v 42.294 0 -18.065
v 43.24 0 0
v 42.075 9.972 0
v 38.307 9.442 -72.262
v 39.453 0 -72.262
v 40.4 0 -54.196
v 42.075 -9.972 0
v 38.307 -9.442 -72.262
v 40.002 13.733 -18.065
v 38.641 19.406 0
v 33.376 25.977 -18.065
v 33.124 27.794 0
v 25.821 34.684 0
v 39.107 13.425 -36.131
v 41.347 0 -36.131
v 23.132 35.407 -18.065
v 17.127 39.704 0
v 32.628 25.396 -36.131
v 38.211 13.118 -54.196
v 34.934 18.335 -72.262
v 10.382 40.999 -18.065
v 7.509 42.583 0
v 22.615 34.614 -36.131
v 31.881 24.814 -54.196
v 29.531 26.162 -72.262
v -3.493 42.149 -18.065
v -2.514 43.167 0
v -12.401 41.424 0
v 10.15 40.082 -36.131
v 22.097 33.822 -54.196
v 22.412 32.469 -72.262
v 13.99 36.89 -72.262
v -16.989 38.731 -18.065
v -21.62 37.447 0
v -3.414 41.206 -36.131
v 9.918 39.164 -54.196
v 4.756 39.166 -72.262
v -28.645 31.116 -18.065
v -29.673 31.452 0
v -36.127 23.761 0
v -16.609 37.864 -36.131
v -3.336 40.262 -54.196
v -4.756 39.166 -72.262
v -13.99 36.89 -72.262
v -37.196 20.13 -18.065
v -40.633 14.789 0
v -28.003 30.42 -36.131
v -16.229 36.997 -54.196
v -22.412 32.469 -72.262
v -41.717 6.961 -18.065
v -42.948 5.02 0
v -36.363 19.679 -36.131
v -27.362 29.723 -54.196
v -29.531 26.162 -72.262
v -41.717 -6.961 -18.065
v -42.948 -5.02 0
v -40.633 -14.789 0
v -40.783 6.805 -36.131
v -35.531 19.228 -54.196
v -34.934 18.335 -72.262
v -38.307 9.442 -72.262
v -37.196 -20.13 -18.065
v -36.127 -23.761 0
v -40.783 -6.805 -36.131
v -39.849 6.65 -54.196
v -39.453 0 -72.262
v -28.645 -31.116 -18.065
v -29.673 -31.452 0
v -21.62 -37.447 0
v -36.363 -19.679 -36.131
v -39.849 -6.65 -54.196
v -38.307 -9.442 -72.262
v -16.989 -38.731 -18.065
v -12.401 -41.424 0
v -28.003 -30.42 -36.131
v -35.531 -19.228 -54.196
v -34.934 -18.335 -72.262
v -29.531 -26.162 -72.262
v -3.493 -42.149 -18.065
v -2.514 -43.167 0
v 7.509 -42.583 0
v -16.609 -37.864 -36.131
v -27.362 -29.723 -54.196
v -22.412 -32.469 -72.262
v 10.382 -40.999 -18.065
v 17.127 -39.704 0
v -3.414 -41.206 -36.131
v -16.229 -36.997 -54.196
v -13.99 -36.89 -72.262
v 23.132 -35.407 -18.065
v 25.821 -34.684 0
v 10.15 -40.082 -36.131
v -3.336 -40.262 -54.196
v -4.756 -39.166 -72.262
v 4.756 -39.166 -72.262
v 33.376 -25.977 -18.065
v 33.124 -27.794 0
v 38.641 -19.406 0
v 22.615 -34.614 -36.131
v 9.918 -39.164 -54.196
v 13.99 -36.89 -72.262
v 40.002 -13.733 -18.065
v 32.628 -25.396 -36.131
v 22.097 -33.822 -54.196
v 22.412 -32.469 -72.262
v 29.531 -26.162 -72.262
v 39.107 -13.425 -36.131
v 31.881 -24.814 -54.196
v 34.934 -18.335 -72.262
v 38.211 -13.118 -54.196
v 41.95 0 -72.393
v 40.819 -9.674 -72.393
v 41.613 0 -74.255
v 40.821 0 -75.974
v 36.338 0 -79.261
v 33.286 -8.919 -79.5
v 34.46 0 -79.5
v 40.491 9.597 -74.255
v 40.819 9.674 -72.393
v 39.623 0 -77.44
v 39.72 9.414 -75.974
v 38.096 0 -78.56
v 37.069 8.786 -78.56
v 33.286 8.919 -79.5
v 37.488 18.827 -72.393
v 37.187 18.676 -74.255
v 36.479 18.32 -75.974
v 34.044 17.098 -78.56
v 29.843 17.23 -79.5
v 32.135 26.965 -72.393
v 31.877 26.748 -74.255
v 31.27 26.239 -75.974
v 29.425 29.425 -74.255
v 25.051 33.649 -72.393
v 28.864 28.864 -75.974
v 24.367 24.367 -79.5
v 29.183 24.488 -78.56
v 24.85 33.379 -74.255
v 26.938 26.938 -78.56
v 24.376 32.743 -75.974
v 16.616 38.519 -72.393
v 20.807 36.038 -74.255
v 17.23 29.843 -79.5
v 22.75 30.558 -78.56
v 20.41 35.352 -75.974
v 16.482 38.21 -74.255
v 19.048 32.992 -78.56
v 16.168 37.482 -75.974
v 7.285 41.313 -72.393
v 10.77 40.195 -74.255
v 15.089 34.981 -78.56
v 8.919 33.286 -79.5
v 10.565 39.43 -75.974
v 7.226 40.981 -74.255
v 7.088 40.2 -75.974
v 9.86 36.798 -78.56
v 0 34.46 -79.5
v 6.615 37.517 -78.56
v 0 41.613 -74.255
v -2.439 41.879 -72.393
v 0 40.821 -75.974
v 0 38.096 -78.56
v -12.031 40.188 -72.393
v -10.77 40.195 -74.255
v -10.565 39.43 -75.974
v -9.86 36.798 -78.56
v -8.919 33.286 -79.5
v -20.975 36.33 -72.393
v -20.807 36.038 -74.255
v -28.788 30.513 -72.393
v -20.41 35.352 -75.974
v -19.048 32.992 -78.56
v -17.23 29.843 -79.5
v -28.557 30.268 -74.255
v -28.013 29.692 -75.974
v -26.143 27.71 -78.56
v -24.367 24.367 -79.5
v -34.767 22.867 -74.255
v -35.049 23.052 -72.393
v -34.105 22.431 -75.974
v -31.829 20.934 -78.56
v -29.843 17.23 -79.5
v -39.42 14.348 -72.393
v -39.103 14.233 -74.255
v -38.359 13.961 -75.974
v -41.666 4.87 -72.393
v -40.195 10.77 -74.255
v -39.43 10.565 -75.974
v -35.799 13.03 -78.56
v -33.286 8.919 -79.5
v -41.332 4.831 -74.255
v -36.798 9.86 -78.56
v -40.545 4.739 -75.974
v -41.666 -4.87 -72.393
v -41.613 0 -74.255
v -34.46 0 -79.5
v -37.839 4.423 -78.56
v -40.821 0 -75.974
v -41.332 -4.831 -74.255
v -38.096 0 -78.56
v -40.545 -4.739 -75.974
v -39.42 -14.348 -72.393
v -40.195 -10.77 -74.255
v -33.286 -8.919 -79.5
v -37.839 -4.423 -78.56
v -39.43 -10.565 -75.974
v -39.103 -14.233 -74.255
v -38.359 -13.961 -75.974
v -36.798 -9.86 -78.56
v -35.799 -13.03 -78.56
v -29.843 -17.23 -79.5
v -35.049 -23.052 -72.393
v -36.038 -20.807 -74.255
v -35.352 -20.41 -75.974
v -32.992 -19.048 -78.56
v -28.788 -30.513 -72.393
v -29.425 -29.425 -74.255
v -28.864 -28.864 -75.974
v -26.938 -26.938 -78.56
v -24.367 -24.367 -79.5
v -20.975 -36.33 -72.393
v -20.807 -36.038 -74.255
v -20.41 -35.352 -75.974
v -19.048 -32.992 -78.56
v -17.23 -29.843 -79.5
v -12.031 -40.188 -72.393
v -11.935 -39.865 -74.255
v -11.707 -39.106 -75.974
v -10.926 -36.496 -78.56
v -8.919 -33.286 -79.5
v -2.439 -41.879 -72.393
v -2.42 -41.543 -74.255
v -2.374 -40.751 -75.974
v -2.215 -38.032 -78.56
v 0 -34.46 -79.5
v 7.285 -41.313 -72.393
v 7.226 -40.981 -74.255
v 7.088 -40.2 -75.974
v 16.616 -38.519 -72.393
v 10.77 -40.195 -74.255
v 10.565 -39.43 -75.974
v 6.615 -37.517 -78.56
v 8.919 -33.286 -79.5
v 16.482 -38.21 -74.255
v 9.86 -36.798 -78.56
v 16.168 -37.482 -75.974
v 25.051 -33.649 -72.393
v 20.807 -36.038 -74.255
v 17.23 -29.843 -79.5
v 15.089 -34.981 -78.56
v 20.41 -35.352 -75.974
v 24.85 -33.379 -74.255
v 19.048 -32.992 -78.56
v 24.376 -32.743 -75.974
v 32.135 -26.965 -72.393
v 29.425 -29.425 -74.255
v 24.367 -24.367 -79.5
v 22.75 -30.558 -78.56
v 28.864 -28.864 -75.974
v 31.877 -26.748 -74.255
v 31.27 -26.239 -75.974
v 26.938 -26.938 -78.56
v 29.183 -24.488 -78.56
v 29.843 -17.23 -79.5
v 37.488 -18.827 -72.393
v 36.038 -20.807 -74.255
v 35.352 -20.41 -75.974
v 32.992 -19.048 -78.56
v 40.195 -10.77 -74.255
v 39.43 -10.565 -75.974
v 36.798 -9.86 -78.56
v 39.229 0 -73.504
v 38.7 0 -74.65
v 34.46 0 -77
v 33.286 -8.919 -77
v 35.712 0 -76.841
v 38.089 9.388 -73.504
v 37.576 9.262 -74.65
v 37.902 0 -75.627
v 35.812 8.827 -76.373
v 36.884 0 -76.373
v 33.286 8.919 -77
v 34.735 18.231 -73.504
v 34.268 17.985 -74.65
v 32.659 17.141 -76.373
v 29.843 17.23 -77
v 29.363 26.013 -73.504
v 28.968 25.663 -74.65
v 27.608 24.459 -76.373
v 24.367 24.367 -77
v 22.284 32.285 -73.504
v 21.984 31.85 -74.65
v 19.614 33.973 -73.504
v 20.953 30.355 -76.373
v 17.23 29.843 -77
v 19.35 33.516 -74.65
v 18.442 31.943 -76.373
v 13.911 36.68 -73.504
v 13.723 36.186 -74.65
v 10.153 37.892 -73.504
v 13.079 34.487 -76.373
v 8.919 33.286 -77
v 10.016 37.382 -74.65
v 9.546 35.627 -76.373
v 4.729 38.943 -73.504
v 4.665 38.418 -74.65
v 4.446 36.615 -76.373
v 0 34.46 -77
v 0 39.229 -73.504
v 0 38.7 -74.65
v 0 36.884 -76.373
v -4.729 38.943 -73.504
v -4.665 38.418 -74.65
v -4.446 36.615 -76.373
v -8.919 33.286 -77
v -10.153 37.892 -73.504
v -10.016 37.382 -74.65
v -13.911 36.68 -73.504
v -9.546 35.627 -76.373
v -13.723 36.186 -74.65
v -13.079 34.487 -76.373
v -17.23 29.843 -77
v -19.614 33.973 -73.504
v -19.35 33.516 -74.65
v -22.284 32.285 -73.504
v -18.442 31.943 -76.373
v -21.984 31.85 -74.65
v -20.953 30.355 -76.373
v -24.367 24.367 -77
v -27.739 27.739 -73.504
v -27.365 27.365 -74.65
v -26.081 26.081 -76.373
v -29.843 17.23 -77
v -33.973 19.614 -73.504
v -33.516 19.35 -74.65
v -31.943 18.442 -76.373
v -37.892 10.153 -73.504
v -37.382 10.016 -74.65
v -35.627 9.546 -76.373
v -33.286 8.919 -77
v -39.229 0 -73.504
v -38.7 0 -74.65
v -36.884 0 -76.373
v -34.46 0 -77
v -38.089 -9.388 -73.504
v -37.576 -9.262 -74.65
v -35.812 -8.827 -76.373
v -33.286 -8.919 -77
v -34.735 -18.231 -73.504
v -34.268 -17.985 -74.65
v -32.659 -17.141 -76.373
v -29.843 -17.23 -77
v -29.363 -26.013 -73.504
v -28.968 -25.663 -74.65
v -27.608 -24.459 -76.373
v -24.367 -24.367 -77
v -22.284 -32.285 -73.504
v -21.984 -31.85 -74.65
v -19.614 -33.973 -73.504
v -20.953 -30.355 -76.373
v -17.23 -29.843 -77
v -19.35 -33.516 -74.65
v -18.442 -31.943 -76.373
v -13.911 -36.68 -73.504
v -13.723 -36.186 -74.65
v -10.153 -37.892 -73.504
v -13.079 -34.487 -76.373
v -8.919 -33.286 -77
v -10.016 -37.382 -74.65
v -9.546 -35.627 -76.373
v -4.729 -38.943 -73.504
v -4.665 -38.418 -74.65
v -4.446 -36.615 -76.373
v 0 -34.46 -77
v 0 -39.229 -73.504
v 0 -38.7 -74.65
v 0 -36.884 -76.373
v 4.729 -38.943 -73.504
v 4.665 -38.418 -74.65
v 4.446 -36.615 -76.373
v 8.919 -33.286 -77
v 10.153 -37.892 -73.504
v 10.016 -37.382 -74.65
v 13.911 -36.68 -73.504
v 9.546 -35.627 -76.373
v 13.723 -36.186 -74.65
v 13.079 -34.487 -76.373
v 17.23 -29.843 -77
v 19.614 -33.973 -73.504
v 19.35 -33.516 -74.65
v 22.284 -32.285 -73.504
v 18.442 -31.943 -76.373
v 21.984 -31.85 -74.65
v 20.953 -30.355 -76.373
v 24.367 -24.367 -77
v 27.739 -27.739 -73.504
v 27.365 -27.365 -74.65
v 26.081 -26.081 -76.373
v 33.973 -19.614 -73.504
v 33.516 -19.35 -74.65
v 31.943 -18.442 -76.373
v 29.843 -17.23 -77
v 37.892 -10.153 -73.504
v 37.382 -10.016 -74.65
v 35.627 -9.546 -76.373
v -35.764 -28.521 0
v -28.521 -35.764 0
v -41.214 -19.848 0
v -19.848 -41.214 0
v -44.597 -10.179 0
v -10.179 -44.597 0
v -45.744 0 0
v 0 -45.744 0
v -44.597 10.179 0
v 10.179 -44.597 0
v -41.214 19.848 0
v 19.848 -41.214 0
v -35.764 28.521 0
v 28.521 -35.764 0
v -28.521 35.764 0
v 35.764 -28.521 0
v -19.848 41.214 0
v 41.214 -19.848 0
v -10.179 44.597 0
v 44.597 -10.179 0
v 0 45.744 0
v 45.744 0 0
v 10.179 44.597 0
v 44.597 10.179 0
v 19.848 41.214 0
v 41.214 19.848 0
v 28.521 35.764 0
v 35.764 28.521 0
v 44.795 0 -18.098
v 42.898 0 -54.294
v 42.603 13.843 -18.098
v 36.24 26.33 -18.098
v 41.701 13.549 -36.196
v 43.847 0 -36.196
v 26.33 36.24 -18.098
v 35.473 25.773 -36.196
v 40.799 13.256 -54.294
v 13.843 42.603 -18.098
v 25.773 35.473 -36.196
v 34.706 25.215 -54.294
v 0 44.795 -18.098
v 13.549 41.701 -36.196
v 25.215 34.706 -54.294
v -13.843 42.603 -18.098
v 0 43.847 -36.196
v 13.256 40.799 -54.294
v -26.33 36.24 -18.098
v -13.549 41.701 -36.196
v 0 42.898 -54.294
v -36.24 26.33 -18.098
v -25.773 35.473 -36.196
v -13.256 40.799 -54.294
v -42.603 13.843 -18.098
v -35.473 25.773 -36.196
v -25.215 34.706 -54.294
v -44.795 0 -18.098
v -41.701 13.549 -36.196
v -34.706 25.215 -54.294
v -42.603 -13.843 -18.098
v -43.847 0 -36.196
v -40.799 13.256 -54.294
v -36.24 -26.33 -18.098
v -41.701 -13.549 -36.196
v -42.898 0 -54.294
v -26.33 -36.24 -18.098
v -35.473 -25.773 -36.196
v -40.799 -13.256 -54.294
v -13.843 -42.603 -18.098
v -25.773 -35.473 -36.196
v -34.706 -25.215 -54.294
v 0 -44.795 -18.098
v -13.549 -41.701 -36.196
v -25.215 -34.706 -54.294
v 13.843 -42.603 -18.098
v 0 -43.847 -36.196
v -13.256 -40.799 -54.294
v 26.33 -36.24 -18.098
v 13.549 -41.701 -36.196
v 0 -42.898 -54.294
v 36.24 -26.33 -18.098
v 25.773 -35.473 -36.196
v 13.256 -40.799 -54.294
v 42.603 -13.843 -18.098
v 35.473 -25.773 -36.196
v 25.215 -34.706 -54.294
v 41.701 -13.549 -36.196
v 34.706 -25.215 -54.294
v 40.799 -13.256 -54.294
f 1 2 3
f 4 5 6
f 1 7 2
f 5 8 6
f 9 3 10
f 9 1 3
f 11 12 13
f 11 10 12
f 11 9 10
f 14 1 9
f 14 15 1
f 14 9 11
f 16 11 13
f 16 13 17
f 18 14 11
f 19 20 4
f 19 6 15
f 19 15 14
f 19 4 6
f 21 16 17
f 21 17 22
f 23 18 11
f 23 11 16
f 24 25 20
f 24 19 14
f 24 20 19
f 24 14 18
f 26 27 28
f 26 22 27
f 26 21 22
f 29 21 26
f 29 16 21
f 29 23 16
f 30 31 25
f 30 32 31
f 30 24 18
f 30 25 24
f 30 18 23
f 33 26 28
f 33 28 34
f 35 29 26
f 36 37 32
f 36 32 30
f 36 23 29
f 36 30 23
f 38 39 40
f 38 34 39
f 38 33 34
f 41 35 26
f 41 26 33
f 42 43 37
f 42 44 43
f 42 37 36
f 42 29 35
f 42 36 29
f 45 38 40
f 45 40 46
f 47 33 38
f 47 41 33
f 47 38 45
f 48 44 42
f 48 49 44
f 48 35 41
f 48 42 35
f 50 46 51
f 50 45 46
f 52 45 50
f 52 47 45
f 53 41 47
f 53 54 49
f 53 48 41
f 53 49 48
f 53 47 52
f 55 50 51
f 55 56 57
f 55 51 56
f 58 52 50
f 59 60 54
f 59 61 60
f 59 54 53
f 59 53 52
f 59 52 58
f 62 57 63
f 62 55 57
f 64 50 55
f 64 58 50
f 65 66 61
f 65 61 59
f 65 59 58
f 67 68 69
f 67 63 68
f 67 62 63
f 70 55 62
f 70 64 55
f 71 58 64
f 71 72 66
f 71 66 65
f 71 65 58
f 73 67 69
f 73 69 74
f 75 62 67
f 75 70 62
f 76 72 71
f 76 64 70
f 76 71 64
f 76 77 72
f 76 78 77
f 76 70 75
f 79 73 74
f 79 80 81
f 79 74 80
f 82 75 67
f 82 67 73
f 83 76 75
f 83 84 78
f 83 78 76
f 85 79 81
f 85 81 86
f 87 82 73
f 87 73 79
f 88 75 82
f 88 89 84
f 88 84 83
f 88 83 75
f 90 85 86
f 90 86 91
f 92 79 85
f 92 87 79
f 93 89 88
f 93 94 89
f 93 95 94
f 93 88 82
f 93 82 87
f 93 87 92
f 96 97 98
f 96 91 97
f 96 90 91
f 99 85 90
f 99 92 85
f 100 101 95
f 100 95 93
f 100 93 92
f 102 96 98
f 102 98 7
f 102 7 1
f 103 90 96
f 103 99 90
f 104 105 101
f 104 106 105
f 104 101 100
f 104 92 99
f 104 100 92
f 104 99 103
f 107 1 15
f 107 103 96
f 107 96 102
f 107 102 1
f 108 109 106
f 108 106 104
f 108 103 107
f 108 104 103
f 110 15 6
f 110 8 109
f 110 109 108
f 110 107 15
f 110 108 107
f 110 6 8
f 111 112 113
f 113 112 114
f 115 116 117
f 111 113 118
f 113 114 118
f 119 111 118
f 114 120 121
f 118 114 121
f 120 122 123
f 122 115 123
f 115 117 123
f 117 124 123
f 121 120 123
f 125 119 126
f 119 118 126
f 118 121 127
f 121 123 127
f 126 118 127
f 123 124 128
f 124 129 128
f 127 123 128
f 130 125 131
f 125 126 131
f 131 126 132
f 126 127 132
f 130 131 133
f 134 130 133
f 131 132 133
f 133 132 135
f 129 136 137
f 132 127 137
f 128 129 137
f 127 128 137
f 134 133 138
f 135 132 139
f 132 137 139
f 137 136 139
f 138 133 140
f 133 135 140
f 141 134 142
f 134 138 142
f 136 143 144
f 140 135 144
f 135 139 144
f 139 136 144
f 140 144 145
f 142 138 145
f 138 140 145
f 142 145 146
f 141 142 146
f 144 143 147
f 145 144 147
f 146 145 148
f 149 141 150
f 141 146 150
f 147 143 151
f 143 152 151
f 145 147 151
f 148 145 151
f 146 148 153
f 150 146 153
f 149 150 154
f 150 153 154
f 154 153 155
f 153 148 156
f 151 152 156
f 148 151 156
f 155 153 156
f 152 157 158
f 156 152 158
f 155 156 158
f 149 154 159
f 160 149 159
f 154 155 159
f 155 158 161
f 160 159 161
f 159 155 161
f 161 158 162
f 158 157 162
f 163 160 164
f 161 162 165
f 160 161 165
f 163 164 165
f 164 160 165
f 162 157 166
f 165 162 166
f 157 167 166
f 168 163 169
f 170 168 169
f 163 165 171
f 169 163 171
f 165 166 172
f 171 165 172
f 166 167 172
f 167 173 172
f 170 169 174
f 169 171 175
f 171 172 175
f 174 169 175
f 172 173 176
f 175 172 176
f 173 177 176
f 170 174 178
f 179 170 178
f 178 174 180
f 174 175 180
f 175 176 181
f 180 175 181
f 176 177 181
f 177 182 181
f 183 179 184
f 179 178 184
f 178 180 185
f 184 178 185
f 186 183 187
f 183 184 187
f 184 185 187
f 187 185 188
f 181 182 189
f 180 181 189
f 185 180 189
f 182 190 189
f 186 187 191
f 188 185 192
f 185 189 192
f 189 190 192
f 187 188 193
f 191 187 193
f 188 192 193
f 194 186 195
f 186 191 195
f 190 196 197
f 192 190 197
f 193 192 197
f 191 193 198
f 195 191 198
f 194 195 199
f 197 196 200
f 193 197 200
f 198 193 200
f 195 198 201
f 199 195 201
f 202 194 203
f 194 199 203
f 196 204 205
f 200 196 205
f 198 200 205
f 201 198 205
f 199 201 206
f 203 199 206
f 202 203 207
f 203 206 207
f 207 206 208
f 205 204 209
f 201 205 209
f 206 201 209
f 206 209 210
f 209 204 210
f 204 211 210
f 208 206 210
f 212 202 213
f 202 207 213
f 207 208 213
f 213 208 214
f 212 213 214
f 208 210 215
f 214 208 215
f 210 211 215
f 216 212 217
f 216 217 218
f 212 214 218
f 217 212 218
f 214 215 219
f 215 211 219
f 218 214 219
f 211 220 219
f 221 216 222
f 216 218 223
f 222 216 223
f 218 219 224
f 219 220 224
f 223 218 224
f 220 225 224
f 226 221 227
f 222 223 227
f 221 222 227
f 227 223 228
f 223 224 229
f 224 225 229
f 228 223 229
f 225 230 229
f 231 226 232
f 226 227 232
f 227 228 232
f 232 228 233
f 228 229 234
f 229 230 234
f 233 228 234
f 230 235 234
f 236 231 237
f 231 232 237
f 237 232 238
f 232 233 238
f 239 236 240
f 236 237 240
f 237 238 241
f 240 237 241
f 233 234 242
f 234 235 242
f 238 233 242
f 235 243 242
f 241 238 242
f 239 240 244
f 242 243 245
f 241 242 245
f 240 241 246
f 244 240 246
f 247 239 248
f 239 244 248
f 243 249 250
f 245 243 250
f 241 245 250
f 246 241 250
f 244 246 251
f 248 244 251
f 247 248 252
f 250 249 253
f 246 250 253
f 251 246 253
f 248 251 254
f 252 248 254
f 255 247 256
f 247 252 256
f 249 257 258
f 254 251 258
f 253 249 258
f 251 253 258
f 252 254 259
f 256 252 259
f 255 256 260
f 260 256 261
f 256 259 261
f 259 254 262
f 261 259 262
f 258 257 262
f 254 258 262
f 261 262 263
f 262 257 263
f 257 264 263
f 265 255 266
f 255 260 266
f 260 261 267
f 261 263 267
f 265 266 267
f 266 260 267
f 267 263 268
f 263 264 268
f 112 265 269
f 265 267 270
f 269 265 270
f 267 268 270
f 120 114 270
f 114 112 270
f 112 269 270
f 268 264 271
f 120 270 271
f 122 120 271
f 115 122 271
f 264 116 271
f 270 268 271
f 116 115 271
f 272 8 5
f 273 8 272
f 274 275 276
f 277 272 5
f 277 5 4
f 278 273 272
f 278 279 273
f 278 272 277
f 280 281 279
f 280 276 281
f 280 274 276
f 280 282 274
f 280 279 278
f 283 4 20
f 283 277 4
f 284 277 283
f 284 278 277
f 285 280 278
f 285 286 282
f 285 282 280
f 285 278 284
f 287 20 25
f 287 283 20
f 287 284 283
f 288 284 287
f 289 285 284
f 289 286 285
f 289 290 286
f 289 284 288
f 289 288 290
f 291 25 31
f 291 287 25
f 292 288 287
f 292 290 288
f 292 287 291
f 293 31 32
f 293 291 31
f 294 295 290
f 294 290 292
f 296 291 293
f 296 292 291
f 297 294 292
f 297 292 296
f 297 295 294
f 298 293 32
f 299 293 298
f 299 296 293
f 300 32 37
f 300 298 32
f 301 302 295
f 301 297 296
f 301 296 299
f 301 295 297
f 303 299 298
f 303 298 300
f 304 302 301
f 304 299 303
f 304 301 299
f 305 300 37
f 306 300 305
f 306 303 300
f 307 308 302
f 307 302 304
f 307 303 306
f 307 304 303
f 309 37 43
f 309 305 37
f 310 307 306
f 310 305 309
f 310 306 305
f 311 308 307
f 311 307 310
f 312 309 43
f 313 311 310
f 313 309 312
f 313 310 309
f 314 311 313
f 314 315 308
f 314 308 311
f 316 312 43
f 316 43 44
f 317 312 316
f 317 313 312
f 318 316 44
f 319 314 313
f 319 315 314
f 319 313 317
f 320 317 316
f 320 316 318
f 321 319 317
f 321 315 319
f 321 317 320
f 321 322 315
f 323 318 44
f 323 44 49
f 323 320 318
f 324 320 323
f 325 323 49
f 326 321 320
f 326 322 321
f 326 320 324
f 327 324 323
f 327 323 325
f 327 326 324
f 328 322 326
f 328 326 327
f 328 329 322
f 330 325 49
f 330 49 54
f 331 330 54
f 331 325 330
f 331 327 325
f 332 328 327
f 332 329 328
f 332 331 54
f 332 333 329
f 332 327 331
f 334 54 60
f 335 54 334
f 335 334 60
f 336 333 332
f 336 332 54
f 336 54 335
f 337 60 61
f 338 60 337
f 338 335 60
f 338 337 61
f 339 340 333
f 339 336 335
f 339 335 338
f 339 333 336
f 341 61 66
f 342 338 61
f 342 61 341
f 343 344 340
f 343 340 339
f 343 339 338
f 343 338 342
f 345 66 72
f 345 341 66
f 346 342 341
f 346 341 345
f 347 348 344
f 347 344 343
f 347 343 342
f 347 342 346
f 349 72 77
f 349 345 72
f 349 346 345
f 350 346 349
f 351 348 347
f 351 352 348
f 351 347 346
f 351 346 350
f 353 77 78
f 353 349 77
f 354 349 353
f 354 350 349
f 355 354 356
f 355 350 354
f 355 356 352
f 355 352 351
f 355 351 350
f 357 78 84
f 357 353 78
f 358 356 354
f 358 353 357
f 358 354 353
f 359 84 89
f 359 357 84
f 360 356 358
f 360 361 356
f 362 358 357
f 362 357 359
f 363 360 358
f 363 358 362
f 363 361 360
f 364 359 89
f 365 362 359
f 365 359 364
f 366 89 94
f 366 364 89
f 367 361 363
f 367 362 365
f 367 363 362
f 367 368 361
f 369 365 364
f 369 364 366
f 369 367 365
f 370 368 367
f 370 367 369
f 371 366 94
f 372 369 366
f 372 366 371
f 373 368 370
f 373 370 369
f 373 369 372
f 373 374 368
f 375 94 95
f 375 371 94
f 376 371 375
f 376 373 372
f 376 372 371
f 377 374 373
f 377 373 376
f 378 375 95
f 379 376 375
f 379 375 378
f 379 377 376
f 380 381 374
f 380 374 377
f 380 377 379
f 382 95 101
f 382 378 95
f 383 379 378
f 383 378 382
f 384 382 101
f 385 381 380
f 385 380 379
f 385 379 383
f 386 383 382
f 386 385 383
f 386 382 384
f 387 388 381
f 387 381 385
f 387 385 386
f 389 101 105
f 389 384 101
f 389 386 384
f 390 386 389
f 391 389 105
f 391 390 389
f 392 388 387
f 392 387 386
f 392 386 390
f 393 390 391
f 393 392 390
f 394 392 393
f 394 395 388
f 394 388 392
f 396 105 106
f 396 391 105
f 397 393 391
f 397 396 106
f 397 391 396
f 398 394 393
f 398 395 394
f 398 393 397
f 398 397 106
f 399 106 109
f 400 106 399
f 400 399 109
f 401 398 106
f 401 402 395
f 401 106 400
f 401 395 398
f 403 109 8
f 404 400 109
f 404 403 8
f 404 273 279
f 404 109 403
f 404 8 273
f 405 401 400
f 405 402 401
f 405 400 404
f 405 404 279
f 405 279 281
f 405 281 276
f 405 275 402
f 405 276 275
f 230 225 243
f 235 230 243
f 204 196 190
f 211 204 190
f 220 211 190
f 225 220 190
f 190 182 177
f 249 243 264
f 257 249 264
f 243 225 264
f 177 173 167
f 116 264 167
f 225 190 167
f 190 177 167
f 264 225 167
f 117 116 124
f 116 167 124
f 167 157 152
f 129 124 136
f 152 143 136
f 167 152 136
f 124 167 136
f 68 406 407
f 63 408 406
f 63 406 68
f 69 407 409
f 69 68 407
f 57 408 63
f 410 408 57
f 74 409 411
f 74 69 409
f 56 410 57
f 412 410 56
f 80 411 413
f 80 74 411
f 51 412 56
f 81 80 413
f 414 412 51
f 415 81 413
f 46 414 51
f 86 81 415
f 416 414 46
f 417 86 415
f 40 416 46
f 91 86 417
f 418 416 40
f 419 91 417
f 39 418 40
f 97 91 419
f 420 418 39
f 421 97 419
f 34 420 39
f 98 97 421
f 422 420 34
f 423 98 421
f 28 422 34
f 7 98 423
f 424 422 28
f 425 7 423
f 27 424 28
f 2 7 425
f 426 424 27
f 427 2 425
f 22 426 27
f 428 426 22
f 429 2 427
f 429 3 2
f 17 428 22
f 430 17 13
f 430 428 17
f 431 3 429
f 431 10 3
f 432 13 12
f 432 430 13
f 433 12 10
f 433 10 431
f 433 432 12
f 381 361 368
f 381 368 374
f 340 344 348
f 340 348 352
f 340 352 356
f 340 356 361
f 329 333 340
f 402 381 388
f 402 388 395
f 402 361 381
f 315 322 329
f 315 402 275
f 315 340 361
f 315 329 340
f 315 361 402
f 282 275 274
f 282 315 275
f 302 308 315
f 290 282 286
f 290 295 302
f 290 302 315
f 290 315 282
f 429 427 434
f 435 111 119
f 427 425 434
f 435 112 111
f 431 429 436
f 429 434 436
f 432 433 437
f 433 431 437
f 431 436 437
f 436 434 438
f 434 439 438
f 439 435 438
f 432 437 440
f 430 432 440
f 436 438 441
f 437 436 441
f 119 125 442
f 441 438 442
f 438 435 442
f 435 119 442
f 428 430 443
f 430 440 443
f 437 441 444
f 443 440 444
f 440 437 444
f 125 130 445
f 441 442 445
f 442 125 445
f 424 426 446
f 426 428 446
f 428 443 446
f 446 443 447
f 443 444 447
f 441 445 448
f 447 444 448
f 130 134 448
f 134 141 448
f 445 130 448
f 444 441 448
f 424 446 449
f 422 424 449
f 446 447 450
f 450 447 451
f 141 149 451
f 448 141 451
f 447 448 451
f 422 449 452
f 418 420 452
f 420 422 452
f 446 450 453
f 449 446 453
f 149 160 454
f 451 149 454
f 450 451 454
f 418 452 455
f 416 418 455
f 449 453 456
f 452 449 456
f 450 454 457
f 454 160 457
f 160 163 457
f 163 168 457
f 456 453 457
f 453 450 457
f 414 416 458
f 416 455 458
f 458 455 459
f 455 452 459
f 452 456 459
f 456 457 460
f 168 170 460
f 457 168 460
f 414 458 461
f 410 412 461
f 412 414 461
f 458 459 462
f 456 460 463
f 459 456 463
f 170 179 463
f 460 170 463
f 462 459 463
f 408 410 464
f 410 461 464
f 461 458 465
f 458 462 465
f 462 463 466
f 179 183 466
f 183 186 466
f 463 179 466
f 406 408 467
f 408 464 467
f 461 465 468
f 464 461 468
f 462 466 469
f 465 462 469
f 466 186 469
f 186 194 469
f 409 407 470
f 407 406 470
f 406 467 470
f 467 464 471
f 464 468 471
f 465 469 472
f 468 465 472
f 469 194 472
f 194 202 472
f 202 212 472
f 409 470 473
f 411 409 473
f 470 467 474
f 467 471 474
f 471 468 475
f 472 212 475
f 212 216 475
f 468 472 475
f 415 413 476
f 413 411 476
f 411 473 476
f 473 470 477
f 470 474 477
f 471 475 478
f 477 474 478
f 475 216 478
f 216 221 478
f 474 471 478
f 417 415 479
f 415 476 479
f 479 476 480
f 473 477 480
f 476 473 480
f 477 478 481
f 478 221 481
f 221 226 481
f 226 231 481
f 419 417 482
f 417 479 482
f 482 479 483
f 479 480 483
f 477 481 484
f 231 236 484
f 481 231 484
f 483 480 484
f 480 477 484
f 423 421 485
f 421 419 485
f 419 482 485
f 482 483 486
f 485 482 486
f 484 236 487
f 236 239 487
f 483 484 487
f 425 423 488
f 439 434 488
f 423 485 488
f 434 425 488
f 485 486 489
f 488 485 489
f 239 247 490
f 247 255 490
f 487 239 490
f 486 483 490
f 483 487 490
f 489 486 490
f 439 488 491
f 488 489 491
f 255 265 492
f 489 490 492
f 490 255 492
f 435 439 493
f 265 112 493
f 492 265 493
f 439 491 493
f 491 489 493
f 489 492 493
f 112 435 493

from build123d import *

# Parameters (mm, degrees)
F0_R     = 43.2404063775
F1_DEPTH = 77
F1_TAPER = 3
F2_R     = 5
F3_T     = 2.5


with BuildPart() as f1:
    # F0 (on Top) → F1 (new body)
    with BuildSketch(Plane.XY):
        Circle(F0_R)
    extrude(amount=-F1_DEPTH, taper=F1_TAPER)

    # F2
    f2_edges = [f1.edges().sort_by_distance(p)[0] for p in [
        (-39.205007, 0, -77),
    ]]
    fillet(f2_edges, radius=F2_R)

    # F3
    f3_openings = [f1.faces().sort_by_distance(p)[0] for p in [
        (0, 0, 0),
    ]]
    offset(amount=F3_T, openings=f3_openings, kind=Kind.INTERSECTION)


solid = f1.part
